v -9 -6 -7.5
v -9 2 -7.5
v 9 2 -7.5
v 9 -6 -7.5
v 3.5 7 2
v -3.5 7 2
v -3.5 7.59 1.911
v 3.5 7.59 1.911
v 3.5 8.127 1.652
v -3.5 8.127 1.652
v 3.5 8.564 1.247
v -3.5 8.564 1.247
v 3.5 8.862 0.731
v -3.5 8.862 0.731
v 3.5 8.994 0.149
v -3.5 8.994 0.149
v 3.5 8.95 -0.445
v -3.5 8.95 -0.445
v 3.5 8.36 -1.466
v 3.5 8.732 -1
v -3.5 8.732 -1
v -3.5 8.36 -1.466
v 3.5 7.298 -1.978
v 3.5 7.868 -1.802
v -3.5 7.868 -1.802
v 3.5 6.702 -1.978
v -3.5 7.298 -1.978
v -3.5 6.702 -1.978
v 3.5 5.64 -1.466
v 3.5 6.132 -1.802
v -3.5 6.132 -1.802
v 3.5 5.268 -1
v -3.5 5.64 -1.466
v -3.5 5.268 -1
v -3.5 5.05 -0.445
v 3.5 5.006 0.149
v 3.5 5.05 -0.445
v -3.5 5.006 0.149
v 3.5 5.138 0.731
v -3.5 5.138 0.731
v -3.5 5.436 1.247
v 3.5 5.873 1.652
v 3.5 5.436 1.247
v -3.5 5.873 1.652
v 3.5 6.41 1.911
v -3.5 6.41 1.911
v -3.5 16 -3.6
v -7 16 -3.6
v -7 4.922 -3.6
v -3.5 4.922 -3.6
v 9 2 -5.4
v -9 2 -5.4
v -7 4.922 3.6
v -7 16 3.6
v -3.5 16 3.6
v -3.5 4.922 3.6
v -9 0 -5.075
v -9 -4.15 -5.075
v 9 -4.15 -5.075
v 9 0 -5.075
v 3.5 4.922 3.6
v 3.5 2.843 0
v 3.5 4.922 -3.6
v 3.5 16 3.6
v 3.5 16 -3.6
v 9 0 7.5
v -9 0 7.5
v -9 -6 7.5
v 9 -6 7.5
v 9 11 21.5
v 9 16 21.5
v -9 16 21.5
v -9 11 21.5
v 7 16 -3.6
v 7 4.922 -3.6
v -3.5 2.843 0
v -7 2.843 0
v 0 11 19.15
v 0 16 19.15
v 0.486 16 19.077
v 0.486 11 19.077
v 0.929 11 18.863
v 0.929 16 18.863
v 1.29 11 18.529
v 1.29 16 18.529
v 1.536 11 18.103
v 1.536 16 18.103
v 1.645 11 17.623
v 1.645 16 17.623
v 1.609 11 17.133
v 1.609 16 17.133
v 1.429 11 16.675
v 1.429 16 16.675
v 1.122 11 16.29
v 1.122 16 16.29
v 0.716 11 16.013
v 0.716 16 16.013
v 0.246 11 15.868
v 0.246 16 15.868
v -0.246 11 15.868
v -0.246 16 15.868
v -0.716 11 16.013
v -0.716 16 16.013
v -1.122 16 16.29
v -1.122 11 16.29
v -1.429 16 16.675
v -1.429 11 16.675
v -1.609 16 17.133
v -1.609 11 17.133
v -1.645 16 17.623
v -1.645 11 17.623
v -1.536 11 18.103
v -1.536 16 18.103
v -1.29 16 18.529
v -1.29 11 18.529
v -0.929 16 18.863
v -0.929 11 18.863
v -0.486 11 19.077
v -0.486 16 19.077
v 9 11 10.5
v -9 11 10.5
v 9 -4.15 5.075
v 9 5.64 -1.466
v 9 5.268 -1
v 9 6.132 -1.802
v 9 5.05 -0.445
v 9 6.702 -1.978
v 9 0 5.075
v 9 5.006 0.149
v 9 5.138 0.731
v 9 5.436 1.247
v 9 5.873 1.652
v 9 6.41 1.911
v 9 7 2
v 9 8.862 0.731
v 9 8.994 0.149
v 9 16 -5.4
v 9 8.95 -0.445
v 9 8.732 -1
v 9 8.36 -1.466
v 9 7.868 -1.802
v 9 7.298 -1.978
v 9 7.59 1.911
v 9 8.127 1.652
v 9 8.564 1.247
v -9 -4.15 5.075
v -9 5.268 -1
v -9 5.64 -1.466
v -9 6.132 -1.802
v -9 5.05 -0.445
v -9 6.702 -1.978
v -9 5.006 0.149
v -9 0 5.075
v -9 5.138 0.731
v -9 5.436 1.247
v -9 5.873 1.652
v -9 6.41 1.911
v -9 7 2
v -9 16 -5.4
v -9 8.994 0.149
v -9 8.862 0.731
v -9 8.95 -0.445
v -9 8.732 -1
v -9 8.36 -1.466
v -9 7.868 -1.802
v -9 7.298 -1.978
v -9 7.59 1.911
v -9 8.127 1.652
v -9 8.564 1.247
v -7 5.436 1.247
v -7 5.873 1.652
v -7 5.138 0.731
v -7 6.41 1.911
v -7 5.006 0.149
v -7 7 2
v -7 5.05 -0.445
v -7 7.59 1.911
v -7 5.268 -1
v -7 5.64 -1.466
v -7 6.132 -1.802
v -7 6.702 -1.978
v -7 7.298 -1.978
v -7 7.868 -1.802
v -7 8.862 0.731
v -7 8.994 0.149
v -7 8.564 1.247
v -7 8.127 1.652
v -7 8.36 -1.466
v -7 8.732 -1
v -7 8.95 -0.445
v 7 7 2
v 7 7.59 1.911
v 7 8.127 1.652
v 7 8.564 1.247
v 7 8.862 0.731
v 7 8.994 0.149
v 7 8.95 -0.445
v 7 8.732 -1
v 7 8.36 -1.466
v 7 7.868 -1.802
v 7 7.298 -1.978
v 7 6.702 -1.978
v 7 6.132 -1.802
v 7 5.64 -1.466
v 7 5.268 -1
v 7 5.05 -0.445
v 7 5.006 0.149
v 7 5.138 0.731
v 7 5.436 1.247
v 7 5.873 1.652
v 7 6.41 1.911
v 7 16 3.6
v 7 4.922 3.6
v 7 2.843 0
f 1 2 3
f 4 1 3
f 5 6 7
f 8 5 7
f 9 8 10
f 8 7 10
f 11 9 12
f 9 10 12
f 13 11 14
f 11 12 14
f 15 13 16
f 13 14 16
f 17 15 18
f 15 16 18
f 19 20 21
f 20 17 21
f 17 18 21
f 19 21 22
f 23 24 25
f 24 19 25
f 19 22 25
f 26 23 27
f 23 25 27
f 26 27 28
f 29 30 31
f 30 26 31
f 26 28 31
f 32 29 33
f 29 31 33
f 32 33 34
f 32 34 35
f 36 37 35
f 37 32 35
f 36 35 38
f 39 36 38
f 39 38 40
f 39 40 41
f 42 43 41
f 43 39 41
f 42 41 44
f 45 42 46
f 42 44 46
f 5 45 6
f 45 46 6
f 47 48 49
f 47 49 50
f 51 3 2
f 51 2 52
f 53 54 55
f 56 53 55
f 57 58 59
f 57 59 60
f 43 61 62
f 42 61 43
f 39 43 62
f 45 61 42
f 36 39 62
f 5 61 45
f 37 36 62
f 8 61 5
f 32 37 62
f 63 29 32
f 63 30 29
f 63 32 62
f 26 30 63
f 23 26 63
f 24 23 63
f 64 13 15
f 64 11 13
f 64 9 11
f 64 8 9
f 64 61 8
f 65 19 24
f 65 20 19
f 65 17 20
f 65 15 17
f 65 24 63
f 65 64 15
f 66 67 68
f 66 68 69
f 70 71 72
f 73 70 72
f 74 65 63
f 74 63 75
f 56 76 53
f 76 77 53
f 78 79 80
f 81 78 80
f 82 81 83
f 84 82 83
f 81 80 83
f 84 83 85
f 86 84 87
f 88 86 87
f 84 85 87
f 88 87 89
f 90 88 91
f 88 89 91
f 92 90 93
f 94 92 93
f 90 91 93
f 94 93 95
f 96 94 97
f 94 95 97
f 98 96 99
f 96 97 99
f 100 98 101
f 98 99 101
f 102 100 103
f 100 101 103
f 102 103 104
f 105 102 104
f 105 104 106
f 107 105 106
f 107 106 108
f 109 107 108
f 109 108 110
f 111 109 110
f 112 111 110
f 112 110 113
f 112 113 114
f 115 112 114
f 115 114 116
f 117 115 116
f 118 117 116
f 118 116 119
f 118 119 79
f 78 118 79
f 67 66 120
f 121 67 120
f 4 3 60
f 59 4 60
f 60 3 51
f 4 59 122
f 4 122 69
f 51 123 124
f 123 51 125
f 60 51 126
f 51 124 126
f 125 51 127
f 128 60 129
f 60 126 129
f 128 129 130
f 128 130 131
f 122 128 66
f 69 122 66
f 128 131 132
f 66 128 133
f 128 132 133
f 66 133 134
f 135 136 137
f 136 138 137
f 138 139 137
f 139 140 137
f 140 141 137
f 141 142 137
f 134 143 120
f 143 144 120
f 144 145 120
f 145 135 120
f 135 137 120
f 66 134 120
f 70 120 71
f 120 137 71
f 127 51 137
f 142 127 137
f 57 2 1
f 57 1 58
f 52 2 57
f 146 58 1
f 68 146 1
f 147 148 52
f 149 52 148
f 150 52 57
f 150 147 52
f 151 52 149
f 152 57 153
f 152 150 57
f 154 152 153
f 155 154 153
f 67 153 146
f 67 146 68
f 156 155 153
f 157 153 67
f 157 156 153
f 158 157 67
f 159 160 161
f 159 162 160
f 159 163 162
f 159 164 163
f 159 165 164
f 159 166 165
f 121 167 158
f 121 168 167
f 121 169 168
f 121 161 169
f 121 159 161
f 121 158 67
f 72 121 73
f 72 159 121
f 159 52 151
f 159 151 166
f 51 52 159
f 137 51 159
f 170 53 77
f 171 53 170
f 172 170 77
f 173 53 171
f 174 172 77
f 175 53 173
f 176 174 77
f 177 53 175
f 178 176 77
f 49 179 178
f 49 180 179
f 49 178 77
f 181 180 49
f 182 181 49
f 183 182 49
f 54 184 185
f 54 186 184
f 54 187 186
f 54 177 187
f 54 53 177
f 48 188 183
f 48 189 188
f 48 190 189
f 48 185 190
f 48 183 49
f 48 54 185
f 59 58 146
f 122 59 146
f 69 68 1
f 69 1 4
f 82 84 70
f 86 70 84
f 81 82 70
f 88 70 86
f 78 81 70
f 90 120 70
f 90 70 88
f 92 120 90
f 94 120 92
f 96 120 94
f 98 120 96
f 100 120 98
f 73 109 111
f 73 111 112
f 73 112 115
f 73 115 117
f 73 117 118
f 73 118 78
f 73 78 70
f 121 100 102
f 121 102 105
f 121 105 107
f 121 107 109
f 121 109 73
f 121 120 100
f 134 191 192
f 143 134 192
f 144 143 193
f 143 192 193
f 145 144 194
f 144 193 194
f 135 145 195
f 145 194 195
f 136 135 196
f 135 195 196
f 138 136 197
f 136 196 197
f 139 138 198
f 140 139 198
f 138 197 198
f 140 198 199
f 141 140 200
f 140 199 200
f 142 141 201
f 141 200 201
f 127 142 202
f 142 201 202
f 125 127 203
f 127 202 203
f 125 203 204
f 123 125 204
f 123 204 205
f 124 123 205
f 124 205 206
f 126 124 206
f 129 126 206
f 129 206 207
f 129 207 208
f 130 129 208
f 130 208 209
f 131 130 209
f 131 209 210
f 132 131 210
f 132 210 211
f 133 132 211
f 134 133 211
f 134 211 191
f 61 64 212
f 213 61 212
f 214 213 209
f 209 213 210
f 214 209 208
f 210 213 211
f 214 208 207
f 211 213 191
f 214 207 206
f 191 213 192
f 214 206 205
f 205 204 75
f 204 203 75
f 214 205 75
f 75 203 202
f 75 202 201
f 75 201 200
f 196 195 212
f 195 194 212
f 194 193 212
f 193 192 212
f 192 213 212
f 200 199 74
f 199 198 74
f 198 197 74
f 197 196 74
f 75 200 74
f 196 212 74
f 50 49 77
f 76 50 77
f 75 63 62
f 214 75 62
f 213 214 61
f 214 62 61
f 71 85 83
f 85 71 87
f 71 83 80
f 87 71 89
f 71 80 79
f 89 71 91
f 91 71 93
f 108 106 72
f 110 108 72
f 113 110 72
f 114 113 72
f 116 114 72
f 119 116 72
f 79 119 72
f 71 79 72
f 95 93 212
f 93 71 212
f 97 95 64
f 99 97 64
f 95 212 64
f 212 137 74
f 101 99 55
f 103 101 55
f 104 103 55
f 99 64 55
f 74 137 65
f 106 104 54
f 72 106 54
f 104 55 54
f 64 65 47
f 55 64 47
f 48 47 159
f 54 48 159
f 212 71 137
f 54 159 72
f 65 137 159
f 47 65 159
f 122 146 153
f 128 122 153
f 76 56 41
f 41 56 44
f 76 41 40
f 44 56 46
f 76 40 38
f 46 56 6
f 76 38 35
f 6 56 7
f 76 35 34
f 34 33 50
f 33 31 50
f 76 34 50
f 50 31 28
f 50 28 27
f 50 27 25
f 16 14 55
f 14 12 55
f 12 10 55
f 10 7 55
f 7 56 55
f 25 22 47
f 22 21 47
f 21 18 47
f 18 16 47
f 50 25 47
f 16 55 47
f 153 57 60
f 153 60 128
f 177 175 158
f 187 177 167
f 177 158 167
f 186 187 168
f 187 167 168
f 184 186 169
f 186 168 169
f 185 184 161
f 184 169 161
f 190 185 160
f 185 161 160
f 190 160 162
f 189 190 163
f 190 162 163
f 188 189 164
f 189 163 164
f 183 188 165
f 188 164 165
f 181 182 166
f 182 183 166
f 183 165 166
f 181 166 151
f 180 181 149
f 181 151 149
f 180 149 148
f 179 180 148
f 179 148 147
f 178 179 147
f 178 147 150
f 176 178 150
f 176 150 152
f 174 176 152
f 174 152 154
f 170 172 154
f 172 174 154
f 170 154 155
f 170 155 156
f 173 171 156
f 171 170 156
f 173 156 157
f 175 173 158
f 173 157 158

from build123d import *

# Parameters (mm, degrees)
IZIM1_W                     = 18
IZIM1_H                     = 15
Y_KSEKLIK_EKSTR_ZYON1_DEPTH = 16
IZIM4_R                     = 2
KES_EKSTR_ZYON3_DEPTH       = 26.223996511
IZIM5_W                     = 3.5
IZIM5_H                     = 7.2
KES_EKSTR_ZYON4_DEPTH       = 9
KES_EKSTR_ZYON6_DEPTH       = 1.75
KES_EKSTR_ZYON14_DEPTH      = 1.75
IZIM11_W                    = 18
IZIM11_H                    = 5
MAKAS_DELI_I_DEPTH          = 14
IZIM12_R                    = 1.65
KES_EKSTR_ZYON10_DEPTH      = 8
PAH1_SIZE                   = 11
PAH1_SIZE_2                 = 3
IZIM15_W                    = 18
IZIM15_H                    = 15
ALT_SLOT_DEPTH              = 6
IZIM16_W                    = 10.15
IZIM16_H                    = 4.15
IZIM16_W_2                  = 2.1
IZIM16_H_2                  = 14
KES_EKSTR_ZYON15_DEPTH      = 33.283896915


with BuildPart() as part:
    # Çizim1 → Yükseklik-Ekstrüzyon1 (new body)
    with BuildSketch(Plane(origin=(0, 0, 0), x_dir=(1, 0, 0), z_dir=(0, 1, 0))):
        Rectangle(IZIM1_W, IZIM1_H)
    extrude(amount=Y_KSEKLIK_EKSTR_ZYON1_DEPTH)

    # Çizim4 → Kes-Ekstrüzyon3 (cut, through all)
    with BuildSketch(Plane.ZY.offset(9)):
        with Locations((0, 7)):
            Circle(IZIM4_R)
    extrude(amount=-KES_EKSTR_ZYON3_DEPTH, mode=Mode.SUBTRACT)

    # Çizim5 → Kes-Ekstrüzyon4 (cut)
    with BuildSketch(Plane(origin=(0, 16, 0), x_dir=(1, 0, 0), z_dir=(0, 1, 0))):
        with Locations((5.25, 0)):
            Rectangle(IZIM5_W, IZIM5_H)
        with Locations((-5.25, 0)):
            Rectangle(IZIM5_W, IZIM5_H)
    extrude(amount=-KES_EKSTR_ZYON4_DEPTH, mode=Mode.SUBTRACT)

    # Çizim6 → Kes-Ekstrüzyon6 (cut, symmetric)
    with BuildSketch(Plane.ZY.offset(-5.25)):
        Polygon((3.6, 9.078460969), (0, 11.156921938), (-3.6, 9.078460969), (-3.6, 4.921539031), (0, 2.843078062), (3.6, 4.921539031), align=None)
    extrude(amount=KES_EKSTR_ZYON6_DEPTH, both=True, mode=Mode.SUBTRACT)

    # Çizim14 → Kes-Ekstrüzyon14 (cut, symmetric)
    with BuildSketch(Plane.ZY.offset(5.25)):
        Polygon((3.6, 9.078460969), (0, 11.156921938), (-3.6, 9.078460969), (-3.6, 4.921539031), (0, 2.843078062), (3.6, 4.921539031), align=None)
    extrude(amount=KES_EKSTR_ZYON14_DEPTH, both=True, mode=Mode.SUBTRACT)

    # Çizim11 → makas deliği (add)
    with BuildSketch(Plane(origin=(0, 0, 7.5), x_dir=(-1, 0, 0), z_dir=(0, 0, -1))):
        with Locations((0, 13.5)):
            Rectangle(IZIM11_W, IZIM11_H)
    extrude(amount=-MAKAS_DELI_I_DEPTH)

    # Çizim12 → Kes-Ekstrüzyon10 (cut)
    with BuildSketch(Plane(origin=(0, 16, 0), x_dir=(1, 0, 0), z_dir=(0, 1, 0))):
        with Locations(Location((0, -17.5, 0), (0, 0, 270))):
            Circle(IZIM12_R)
    extrude(amount=-KES_EKSTR_ZYON10_DEPTH, mode=Mode.SUBTRACT)

    # Pah1
    # the kernel refuses this chamfer: 11, 3 mm, written as the material it adds along each edge
    with BuildSketch(Plane(origin=(9, 11, 7.5), x_dir=(0, -0.9999486586881362, -0.010133113430599267), z_dir=(-1, 0, 0))) as pah1_piece_1_section:
        Polygon((PAH1_SIZE * 0.999948658688, PAH1_SIZE * 0.0101331134306), (-PAH1_SIZE_2 * 0.0101331134306, PAH1_SIZE_2 * 0.999948658688), (0, 0), align=None)
    pah1_piece_1 = extrude(amount=18, mode=Mode.PRIVATE)
    pah1_piece_1 = split(pah1_piece_1, bisect_by=Plane(origin=(0, 0, 8.392972415), z_dir=(0, 1, 0)), keep=Keep.TOP, mode=Mode.PRIVATE)
    add(pah1_piece_1)

    # Çizim15 → alt slot (add)
    with BuildSketch(Plane.XZ):
        Rectangle(IZIM15_W, IZIM15_H)
    extrude(amount=ALT_SLOT_DEPTH)

    # Çizim16 → Kes-Ekstrüzyon15 (cut, through all)
    with BuildSketch(Plane.ZY.offset(9)):
        with Locations((0, -2.075)):
            Rectangle(IZIM16_W, IZIM16_H)
        with Locations((-6.45, 9)):
            Rectangle(IZIM16_W_2, IZIM16_H_2)
    extrude(amount=-KES_EKSTR_ZYON15_DEPTH, mode=Mode.SUBTRACT)


solid = part.part
